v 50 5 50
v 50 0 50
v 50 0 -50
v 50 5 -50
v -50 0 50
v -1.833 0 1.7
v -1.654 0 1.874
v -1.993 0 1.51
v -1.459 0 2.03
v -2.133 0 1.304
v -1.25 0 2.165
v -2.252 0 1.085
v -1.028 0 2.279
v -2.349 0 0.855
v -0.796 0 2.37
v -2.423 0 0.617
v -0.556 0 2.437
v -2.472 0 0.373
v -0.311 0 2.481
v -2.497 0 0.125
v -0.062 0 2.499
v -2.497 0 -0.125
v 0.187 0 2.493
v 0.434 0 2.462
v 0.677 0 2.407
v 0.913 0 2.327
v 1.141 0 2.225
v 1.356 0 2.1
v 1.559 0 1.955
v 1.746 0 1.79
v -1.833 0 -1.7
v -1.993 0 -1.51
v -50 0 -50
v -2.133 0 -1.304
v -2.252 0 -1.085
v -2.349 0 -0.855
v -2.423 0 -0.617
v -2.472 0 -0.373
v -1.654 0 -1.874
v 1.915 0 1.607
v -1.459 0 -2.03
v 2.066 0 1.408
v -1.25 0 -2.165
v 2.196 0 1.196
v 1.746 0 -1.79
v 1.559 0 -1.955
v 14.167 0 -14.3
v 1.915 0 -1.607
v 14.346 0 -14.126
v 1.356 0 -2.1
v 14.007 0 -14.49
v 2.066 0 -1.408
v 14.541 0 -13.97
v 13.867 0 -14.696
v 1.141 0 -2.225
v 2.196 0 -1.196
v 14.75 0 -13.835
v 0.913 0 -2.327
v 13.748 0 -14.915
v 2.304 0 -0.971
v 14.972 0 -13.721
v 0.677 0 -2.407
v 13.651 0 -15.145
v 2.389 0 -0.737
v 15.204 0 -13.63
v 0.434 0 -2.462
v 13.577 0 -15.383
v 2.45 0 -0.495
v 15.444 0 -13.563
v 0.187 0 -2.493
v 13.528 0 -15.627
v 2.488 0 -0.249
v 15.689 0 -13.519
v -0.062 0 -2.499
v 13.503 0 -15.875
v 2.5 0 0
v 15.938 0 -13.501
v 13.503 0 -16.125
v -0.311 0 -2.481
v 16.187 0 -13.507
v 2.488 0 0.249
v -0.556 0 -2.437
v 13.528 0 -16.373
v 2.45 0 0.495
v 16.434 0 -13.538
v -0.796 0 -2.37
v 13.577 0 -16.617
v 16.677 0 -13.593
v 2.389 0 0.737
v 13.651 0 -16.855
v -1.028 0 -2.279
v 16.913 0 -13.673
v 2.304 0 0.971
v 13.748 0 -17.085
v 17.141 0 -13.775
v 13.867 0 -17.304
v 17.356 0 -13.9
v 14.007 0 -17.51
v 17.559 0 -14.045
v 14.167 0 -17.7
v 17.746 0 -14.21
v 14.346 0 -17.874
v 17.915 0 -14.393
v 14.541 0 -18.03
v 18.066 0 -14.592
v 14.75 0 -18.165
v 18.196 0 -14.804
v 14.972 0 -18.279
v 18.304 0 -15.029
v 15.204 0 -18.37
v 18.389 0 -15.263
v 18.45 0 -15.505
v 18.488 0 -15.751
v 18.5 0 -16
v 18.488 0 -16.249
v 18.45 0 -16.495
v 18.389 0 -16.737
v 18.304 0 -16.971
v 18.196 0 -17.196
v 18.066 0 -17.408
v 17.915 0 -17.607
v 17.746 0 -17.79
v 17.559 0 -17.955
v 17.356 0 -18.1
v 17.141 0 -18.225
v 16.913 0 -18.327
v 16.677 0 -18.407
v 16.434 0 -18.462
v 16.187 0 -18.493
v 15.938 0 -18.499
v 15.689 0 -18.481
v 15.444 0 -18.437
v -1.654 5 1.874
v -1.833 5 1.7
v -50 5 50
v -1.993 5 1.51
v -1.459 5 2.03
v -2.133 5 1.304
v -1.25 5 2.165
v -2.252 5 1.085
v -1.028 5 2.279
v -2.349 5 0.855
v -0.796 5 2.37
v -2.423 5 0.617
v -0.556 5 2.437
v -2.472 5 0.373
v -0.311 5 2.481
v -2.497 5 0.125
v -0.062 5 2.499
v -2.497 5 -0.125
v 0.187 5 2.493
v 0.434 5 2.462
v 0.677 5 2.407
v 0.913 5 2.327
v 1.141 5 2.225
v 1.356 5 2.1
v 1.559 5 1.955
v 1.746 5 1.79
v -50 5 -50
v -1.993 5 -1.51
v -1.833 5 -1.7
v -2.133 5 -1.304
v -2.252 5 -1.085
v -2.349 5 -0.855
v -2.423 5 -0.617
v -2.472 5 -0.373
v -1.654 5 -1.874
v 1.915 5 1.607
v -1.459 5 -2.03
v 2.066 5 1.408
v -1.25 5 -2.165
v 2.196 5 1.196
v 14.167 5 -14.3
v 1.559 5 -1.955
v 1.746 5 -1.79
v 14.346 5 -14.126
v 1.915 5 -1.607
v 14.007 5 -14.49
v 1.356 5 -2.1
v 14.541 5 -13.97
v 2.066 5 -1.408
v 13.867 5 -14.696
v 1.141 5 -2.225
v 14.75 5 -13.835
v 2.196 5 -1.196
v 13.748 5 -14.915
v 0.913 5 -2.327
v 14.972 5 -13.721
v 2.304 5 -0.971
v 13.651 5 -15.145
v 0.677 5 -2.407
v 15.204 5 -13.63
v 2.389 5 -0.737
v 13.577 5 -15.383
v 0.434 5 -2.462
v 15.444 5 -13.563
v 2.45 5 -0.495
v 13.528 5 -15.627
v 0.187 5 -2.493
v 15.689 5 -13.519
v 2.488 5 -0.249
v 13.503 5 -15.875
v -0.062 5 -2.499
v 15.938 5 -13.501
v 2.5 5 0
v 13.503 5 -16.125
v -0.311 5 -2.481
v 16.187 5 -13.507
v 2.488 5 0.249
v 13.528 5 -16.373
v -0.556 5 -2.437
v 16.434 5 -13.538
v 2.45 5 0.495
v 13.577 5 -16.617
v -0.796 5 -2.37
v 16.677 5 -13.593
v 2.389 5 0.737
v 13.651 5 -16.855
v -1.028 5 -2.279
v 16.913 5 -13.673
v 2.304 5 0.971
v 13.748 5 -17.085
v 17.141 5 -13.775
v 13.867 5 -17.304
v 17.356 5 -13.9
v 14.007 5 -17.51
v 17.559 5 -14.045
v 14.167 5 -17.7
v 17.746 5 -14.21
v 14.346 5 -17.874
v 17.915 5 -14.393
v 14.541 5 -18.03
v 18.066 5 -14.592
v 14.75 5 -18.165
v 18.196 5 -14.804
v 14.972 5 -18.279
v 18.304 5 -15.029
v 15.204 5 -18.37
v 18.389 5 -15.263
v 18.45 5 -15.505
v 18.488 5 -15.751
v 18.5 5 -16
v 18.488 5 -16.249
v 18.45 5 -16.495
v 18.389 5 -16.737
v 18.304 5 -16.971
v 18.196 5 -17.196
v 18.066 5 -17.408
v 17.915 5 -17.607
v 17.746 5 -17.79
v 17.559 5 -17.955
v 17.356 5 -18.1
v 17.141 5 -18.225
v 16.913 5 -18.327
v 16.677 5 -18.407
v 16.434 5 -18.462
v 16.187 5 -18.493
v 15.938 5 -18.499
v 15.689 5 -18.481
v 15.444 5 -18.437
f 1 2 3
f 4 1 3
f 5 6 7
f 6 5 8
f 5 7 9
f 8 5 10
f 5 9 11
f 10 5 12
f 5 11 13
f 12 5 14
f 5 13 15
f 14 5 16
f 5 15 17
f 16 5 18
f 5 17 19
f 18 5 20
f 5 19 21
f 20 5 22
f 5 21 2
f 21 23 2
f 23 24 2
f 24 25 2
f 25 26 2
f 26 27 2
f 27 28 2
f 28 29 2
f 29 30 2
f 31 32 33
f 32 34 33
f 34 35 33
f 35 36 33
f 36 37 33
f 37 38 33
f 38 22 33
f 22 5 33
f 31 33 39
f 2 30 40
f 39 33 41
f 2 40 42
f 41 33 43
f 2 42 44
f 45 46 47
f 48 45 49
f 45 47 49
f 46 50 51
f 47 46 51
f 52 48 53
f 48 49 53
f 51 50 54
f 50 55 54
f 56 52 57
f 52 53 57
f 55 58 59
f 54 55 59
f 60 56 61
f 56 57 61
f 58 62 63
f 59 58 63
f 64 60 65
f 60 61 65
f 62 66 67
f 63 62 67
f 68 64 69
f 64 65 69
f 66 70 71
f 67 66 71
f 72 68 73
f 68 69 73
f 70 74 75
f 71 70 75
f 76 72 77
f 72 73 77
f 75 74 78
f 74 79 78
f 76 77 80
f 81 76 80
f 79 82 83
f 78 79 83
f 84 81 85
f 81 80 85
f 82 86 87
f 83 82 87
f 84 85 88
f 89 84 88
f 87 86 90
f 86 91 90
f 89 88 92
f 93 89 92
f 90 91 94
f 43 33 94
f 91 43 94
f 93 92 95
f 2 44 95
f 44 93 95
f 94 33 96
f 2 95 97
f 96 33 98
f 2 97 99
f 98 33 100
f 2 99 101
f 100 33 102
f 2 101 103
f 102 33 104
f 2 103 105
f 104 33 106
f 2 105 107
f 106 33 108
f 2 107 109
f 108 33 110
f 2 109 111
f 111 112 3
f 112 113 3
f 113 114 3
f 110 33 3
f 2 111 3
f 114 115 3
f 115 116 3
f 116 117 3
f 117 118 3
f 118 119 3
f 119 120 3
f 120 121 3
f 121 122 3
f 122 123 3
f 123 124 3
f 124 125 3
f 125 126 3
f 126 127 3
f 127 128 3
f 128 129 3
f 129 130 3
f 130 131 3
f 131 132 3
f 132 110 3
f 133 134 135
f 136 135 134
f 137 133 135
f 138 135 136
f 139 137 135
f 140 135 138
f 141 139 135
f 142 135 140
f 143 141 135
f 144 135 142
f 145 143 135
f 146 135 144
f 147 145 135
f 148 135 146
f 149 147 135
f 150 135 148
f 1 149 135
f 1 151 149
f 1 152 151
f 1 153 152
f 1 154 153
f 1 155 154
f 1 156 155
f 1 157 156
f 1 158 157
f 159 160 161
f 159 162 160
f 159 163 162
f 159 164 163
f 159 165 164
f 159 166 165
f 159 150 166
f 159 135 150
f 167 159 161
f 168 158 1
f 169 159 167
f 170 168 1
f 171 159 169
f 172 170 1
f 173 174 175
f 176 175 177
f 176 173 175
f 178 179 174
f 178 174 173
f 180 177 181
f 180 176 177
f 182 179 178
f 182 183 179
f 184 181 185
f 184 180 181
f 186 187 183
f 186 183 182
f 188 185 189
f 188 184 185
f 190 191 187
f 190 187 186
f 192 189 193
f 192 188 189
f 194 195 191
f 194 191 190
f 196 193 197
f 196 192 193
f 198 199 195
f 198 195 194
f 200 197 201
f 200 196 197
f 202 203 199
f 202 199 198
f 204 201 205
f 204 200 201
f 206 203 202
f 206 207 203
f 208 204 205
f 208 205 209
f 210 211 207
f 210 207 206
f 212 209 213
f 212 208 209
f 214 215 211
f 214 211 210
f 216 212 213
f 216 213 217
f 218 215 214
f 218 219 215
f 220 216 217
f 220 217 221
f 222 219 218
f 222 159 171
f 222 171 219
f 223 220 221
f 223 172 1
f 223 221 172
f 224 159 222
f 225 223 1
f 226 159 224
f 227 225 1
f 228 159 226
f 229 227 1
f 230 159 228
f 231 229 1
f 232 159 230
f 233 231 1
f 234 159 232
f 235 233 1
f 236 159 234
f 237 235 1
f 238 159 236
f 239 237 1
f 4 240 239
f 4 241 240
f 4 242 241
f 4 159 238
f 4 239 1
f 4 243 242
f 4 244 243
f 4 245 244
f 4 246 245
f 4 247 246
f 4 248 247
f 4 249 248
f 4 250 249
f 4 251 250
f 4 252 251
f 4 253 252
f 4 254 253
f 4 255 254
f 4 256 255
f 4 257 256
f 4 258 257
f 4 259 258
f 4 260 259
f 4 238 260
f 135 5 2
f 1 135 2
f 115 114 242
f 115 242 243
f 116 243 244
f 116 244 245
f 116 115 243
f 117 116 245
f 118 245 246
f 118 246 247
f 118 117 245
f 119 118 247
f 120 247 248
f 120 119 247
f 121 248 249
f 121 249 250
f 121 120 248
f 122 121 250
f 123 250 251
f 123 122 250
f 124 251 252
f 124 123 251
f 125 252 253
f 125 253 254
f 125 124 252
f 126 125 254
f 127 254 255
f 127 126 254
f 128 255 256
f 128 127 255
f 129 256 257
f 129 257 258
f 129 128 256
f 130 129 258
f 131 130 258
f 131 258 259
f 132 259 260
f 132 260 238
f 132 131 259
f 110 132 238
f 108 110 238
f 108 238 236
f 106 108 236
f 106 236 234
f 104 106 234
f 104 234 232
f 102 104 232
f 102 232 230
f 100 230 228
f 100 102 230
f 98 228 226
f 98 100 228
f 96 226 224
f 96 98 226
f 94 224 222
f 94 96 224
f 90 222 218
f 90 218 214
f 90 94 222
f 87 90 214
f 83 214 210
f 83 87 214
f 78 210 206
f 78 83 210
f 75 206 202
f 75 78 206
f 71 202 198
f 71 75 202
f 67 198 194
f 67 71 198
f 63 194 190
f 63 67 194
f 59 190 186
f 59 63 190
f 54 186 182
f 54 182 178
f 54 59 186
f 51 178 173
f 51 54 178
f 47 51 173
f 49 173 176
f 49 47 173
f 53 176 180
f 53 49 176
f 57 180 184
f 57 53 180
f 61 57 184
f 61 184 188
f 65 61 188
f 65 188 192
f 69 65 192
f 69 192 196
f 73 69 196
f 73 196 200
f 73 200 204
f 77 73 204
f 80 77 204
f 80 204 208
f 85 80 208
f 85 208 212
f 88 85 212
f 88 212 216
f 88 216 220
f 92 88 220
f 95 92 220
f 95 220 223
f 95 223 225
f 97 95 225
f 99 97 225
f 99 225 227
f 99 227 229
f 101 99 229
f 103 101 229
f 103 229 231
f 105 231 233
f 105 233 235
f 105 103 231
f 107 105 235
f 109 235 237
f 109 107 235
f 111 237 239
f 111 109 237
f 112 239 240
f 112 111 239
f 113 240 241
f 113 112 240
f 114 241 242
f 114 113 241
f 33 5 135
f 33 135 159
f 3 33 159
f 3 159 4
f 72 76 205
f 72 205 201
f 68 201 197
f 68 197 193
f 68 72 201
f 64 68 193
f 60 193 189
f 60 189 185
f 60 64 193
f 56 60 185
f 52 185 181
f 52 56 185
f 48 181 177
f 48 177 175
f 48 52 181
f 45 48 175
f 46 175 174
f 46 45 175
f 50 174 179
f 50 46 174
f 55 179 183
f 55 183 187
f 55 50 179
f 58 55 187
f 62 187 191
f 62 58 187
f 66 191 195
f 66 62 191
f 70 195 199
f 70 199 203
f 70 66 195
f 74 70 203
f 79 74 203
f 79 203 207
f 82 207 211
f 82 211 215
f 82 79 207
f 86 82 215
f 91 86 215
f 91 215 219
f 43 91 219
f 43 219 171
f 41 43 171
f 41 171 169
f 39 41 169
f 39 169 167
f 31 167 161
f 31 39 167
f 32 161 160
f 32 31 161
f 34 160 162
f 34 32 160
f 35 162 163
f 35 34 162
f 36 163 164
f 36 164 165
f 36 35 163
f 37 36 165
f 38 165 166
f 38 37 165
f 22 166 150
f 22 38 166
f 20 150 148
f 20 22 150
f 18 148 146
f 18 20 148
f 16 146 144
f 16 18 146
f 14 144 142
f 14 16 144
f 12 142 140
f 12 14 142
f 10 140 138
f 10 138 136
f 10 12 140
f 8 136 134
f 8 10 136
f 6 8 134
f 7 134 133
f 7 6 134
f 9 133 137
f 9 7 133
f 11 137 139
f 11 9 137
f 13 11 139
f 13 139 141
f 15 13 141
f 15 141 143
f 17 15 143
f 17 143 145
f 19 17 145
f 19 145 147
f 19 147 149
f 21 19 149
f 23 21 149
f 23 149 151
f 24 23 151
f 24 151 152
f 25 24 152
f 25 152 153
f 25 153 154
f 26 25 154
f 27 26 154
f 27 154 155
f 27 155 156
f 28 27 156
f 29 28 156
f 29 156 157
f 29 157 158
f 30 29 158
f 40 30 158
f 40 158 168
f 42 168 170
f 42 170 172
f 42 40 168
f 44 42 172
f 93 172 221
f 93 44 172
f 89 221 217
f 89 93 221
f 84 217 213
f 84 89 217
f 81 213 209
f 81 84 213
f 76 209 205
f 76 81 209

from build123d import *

# Parameters (mm, degrees)
SKETCH_1_W      = 100
SKETCH_1_H      = 100
SKETCH_1_R      = 2.5
EXTRUDE_1_DEPTH = 5


with BuildPart() as part:
    # 草图1 → 凸台-拉伸1 (new body)
    with BuildSketch(Plane(origin=(0, 0, 0), x_dir=(1, 0, 0), z_dir=(0, 1, 0))):
        Rectangle(SKETCH_1_W, SKETCH_1_H)
        Circle(SKETCH_1_R, mode=Mode.SUBTRACT)
        with Locations((16, 16)):
            Circle(SKETCH_1_R, mode=Mode.SUBTRACT)
    extrude(amount=EXTRUDE_1_DEPTH)


solid = part.part
